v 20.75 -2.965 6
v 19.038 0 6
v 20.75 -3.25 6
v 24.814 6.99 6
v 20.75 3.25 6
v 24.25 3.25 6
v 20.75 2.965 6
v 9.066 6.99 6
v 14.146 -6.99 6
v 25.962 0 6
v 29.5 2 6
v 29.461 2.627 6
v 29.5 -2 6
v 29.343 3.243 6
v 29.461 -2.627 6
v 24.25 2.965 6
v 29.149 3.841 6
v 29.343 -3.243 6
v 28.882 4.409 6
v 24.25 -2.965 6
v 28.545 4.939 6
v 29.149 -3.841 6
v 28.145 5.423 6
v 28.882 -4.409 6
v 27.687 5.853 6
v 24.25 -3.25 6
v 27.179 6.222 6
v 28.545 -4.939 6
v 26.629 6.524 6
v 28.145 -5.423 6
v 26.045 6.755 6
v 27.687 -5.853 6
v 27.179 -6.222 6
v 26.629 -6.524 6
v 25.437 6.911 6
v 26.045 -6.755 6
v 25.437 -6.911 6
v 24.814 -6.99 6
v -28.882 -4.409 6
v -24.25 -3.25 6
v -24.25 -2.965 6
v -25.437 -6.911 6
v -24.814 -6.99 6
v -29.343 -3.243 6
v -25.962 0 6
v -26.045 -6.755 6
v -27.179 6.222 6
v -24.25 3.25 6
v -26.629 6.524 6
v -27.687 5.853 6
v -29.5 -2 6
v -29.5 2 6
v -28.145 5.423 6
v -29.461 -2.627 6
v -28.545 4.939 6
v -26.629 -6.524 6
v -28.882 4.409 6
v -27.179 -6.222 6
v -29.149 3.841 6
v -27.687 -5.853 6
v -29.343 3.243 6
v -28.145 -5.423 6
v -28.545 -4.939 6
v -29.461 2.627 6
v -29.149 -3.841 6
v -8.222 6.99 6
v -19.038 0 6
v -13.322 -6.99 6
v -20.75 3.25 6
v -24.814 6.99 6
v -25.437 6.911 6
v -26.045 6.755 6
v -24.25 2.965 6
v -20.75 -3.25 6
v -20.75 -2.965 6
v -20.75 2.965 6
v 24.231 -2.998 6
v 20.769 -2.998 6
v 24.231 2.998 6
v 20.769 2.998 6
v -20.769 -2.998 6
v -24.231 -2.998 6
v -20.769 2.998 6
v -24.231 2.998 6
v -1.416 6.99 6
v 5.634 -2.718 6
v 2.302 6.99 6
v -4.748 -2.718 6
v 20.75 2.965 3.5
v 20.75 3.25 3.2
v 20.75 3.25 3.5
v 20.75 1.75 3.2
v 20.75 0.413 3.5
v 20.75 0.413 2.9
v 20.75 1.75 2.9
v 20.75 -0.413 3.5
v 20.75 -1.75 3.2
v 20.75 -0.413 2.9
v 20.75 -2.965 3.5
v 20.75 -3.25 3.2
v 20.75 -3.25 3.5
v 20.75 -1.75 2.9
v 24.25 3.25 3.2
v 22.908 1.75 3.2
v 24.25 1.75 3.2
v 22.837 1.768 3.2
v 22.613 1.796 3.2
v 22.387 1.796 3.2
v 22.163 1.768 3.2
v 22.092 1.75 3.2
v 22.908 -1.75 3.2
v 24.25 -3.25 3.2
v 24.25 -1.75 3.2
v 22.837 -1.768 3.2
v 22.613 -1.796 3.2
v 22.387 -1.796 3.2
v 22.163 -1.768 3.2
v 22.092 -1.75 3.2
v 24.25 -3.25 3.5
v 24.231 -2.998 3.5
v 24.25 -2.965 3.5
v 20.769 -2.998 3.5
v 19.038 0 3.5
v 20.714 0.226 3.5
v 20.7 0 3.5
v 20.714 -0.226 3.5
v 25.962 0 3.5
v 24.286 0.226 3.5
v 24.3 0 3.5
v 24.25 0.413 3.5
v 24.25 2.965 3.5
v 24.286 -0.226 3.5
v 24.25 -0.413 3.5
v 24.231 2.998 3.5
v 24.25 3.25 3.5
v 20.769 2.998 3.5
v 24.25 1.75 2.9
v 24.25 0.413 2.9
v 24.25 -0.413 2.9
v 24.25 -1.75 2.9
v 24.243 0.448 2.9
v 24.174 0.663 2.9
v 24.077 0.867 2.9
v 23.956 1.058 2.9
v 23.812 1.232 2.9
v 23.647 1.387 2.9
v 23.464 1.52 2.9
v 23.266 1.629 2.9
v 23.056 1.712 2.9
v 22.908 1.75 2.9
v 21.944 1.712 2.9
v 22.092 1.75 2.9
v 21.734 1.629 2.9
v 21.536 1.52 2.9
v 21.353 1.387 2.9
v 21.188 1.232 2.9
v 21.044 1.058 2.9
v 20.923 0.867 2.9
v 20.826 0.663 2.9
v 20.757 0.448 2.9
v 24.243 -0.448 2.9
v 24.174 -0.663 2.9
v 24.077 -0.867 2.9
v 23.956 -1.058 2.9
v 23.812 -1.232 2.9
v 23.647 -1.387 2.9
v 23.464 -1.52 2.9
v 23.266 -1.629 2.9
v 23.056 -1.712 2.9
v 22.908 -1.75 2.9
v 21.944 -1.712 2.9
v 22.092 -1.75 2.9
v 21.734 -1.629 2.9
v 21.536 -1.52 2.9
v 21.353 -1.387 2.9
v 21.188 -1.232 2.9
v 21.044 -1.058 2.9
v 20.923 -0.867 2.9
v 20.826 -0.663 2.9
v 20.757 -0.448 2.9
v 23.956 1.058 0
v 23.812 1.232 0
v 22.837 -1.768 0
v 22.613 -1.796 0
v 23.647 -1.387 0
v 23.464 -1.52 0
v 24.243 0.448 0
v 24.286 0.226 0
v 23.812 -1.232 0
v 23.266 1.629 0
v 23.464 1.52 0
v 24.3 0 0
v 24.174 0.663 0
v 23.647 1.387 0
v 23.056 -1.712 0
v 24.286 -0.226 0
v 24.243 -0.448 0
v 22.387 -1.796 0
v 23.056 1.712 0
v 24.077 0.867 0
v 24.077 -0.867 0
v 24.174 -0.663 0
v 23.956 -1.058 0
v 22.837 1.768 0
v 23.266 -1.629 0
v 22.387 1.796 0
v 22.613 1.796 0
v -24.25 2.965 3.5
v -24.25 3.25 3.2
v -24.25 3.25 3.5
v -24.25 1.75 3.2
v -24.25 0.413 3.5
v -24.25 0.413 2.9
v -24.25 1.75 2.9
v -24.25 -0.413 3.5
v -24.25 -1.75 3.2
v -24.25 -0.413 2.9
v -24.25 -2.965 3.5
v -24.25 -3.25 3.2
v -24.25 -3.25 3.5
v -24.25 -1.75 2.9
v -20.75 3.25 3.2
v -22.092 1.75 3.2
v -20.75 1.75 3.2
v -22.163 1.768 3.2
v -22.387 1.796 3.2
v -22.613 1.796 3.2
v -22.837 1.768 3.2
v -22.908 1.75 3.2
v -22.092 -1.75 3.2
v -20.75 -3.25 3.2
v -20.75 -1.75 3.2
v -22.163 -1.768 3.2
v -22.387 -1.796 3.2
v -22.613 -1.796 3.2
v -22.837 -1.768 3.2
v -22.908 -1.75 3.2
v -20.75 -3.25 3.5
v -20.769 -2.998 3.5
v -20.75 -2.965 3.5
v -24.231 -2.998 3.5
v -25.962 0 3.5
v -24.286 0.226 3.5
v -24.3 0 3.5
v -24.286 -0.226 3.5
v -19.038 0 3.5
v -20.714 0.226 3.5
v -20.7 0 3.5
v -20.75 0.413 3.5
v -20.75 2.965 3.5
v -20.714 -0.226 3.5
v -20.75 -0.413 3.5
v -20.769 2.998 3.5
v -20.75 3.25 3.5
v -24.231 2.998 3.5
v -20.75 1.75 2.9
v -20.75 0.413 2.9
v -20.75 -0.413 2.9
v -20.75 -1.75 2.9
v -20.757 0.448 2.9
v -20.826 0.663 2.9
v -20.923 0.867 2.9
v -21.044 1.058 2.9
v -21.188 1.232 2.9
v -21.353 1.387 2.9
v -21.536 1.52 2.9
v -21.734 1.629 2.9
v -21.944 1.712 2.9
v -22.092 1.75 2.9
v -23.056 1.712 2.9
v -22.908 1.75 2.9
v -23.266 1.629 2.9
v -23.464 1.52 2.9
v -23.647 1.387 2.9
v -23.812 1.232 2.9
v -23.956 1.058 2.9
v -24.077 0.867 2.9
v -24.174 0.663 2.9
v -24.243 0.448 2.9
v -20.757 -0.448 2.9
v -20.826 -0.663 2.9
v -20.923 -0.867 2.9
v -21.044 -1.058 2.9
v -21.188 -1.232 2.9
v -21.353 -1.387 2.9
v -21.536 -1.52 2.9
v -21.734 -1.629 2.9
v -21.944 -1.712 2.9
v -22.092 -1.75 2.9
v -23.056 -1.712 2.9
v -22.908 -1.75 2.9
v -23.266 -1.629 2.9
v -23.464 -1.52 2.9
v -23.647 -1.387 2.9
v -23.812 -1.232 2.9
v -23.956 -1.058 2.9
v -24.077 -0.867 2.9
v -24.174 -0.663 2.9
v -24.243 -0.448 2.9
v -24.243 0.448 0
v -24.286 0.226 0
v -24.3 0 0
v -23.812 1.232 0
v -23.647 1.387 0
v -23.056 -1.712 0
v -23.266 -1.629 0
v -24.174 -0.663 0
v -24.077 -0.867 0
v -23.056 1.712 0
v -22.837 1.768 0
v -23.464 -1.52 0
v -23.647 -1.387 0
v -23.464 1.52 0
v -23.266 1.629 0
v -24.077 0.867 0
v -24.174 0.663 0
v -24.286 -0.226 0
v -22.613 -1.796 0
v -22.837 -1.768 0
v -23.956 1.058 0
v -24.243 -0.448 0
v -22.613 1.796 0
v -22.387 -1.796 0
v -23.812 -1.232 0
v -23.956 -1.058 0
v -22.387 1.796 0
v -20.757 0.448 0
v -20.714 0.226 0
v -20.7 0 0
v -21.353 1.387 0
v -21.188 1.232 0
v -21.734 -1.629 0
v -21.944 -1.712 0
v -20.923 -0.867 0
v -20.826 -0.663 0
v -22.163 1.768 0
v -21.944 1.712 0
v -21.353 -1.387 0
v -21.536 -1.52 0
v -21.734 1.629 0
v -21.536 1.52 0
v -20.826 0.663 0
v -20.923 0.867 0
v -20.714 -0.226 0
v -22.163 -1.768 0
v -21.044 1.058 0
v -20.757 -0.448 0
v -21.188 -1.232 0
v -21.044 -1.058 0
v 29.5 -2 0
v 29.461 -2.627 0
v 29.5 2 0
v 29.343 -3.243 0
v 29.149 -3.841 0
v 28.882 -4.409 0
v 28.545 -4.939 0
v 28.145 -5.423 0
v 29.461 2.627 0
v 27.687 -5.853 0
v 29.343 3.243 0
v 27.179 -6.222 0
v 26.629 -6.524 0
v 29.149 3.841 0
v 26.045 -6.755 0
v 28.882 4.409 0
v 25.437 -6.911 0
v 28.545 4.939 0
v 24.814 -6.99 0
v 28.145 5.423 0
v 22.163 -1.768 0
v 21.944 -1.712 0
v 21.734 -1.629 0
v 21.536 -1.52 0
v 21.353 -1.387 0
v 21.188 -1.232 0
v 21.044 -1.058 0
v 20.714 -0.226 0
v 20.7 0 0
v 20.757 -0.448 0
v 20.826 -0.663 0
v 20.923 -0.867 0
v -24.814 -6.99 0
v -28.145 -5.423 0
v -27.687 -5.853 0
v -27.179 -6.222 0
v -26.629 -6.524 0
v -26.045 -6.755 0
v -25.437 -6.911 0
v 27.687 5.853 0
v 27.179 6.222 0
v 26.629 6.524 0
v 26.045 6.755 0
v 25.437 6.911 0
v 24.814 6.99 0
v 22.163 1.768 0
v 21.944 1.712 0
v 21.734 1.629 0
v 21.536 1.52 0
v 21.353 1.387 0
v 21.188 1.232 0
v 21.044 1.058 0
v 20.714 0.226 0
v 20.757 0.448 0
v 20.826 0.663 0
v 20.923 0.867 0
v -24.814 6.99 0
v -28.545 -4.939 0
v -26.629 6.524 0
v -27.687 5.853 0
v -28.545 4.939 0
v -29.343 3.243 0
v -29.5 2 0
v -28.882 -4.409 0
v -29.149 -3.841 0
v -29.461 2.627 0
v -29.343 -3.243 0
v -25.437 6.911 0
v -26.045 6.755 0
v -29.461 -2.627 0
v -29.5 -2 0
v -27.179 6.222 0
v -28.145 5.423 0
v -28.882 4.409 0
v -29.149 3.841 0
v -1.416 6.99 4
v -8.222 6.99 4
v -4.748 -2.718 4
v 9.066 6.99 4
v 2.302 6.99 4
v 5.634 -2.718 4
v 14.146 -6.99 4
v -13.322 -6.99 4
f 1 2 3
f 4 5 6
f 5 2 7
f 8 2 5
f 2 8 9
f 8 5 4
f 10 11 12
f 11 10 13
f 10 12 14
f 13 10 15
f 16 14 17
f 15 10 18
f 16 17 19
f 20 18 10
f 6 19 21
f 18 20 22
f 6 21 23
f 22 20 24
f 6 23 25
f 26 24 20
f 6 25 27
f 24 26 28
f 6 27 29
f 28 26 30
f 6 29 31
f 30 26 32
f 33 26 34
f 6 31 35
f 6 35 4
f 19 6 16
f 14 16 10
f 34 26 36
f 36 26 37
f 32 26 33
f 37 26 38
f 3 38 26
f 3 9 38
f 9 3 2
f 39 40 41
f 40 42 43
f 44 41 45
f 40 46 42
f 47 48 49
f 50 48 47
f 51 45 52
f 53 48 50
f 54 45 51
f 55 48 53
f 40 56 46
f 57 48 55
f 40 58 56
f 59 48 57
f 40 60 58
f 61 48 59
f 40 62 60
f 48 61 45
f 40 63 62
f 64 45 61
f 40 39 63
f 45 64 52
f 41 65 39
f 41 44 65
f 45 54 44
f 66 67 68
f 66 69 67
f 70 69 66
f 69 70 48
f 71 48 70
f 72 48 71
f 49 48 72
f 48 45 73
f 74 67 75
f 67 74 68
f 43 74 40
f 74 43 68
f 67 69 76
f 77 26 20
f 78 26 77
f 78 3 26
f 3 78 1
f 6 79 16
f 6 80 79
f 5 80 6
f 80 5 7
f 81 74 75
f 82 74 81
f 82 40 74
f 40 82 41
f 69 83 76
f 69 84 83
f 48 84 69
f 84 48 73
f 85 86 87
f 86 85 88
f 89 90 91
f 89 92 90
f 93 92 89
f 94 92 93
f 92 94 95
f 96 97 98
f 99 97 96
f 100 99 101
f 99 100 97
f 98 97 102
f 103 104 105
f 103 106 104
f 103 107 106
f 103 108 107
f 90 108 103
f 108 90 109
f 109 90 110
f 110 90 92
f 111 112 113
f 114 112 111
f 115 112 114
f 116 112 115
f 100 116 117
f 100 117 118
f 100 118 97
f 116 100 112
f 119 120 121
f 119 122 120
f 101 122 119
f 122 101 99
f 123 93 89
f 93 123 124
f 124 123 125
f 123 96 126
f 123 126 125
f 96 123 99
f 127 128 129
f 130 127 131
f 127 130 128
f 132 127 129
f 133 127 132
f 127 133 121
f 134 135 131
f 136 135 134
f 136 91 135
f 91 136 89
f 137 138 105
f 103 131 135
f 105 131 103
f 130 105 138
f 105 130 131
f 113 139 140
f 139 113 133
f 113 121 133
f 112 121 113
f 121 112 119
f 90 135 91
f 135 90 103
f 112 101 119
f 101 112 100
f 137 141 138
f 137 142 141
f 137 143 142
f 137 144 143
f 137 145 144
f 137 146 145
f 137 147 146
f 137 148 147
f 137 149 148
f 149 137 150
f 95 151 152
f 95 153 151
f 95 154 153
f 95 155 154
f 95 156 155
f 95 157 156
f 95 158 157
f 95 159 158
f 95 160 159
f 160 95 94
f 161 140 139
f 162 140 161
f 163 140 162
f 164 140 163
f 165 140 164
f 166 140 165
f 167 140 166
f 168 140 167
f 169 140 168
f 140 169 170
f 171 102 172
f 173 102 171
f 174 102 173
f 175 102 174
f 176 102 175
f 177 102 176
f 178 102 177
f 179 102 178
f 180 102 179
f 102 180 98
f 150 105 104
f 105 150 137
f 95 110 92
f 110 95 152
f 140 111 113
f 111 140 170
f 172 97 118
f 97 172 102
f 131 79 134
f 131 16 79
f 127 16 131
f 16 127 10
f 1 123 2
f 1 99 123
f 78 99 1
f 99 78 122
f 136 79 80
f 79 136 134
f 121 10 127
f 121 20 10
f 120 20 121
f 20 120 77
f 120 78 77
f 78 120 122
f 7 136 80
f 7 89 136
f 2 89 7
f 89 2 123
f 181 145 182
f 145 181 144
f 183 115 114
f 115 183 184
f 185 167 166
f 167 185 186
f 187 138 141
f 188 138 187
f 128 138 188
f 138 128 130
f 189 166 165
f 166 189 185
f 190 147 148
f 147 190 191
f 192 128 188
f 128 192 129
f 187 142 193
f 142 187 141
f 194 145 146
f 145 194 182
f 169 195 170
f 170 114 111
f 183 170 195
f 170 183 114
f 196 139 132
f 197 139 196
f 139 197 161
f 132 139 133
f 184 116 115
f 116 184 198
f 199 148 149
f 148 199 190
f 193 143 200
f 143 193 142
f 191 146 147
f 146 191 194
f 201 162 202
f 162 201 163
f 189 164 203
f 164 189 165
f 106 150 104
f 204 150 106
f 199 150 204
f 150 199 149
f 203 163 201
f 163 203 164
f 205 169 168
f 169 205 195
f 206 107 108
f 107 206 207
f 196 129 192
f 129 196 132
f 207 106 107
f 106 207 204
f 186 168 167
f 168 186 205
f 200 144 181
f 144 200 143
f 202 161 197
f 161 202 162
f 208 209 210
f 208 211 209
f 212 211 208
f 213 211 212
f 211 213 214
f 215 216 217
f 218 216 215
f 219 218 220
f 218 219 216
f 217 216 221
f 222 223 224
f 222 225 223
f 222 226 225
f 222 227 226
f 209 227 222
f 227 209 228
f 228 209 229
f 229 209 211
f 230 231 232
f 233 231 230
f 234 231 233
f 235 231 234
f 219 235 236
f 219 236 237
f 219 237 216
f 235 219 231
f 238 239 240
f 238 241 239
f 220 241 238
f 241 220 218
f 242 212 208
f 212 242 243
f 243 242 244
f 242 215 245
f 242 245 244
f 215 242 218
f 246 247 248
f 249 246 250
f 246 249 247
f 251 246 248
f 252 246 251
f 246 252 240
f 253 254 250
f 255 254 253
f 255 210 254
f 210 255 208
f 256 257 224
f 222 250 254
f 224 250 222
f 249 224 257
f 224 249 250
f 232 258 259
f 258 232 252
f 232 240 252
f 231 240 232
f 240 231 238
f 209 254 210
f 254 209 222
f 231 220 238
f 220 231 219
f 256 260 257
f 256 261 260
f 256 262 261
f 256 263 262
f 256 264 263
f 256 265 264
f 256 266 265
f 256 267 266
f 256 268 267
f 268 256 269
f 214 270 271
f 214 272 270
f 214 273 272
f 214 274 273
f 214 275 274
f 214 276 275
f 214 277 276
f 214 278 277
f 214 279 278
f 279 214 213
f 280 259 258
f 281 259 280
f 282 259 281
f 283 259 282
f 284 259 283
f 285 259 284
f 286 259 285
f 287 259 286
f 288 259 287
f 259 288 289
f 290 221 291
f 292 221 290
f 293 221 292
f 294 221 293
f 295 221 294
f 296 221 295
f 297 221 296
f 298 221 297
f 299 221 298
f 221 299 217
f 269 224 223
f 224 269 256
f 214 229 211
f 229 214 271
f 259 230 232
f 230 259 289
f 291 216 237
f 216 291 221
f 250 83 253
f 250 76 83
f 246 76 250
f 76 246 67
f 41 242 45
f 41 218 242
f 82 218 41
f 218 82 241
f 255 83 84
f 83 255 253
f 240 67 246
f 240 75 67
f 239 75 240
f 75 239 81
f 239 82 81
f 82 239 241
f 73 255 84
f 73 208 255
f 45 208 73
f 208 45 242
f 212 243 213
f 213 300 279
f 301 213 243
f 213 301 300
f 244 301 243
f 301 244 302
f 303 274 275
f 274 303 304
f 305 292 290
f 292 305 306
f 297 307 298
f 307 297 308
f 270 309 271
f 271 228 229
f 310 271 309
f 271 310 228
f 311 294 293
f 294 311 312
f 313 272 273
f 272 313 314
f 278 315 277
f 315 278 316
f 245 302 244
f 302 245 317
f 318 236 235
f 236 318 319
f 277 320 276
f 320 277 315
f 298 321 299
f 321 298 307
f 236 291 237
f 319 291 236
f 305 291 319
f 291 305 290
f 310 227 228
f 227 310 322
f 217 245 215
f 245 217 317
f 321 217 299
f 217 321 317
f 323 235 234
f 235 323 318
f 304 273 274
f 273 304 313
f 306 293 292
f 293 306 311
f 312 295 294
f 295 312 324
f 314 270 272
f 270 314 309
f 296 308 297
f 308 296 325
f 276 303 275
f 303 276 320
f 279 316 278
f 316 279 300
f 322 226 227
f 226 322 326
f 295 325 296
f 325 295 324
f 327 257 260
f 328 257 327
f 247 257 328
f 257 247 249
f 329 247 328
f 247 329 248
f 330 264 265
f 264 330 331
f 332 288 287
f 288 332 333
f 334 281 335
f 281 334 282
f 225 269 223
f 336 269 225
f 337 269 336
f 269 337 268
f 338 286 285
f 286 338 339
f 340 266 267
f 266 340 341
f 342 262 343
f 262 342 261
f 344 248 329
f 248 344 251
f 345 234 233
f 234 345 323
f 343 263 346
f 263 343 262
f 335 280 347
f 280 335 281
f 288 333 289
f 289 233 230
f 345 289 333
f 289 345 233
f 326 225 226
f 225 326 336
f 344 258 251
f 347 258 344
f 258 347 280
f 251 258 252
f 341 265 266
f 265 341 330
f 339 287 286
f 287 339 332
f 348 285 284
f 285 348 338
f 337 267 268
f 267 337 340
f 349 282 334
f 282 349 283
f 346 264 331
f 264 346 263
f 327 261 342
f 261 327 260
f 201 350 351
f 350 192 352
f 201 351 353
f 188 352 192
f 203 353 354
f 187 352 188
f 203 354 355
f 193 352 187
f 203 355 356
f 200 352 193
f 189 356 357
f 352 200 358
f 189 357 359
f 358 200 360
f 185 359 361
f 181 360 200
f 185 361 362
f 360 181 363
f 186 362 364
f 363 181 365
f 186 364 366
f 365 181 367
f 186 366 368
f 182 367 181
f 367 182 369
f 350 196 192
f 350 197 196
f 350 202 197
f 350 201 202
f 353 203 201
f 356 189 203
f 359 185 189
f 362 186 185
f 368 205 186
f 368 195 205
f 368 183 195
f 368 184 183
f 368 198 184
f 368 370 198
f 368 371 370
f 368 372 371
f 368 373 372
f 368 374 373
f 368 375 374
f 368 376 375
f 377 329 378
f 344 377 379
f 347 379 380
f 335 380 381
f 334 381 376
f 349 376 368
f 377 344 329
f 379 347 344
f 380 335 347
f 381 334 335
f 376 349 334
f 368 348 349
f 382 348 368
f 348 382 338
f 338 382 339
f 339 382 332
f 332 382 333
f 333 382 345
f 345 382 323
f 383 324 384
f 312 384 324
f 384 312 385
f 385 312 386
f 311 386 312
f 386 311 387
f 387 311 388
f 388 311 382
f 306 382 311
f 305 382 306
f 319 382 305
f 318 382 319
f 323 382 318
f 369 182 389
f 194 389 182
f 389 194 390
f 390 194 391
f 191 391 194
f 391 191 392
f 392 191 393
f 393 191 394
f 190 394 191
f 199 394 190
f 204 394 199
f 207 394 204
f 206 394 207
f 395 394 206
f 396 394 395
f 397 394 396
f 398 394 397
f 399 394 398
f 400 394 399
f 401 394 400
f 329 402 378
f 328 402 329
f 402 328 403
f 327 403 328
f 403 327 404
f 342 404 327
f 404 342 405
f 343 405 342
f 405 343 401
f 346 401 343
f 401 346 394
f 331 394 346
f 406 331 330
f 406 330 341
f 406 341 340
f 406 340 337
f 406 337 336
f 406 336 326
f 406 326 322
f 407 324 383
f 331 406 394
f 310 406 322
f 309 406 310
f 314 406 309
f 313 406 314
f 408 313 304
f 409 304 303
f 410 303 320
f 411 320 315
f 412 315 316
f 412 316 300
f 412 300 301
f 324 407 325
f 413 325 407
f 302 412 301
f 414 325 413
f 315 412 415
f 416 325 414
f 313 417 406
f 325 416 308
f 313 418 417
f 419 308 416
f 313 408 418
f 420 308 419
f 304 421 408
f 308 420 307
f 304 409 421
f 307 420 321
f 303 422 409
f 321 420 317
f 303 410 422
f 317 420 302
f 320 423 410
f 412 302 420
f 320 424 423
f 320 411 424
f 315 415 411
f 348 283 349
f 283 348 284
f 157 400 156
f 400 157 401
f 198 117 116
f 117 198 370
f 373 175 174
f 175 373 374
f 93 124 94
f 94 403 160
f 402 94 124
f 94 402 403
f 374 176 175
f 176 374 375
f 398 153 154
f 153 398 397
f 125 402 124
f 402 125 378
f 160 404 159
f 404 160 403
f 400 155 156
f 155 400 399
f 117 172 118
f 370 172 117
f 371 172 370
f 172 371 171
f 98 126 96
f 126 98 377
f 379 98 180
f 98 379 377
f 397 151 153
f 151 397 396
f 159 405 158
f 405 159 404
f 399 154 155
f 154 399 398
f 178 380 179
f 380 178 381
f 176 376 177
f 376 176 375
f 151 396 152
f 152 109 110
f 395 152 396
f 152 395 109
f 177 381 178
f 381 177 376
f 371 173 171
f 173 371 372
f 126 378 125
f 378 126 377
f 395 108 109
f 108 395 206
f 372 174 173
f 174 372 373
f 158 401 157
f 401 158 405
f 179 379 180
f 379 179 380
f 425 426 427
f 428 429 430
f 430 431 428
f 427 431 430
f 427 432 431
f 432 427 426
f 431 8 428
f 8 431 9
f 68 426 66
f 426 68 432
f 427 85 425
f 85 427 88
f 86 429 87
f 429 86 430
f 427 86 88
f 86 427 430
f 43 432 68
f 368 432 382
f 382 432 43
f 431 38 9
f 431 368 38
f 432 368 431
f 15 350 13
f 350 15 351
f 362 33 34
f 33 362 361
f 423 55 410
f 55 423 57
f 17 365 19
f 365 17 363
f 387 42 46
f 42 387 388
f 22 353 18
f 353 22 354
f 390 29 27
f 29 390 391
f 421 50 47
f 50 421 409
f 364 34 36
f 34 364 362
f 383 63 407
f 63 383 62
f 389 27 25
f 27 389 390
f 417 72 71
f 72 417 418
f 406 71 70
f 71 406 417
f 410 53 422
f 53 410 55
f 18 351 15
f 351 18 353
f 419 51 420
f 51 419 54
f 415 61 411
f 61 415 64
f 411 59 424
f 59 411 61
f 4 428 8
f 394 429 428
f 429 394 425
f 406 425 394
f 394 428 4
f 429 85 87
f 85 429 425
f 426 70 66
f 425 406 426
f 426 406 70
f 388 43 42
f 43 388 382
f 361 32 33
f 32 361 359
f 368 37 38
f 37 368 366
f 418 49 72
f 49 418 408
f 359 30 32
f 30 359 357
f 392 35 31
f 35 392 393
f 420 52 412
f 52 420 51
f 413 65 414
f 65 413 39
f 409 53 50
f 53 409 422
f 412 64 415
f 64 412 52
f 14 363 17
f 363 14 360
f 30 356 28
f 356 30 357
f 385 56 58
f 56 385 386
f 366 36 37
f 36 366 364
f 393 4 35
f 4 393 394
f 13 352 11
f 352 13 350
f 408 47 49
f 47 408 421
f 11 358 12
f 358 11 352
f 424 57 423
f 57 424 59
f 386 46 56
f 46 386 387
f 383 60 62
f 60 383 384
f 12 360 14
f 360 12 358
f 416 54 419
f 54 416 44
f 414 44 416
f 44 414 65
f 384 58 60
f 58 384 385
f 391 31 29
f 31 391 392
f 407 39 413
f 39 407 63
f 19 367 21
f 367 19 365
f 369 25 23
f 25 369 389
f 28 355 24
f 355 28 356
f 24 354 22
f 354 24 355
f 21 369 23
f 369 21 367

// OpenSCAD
$fn = 50;


difference() {
	union() {
		hull() {
			translate(v = [-24.5000000000, 2.0000000000, 0]) {
				cylinder(h = 6, r = 5);
			}
			translate(v = [24.5000000000, 2.0000000000, 0]) {
				cylinder(h = 6, r = 5);
			}
			translate(v = [-24.5000000000, -2.0000000000, 0]) {
				cylinder(h = 6, r = 5);
			}
			translate(v = [24.5000000000, -2.0000000000, 0]) {
				cylinder(h = 6, r = 5);
			}
		}
	}
	union() {
		translate(v = [22.5000000000, 0, -20]) {
			rotate(a = [0, 180, 0]) {
				difference() {
					union() {
						translate(v = [0, 0, -26.0000000000]) {
							rotate(a = [0, 0, 0]) {
								difference() {
									union() {
										#translate(v = [-1.7500000000, -3.2500000000, -0.3000000000]) {
											cube(size = [3.5000000000, 6.5000000000, 0.3000000000]);
										}
										#translate(v = [-1.7500000000, -1.7500000000, -0.6000000000]) {
											cube(size = [3.5000000000, 3.5000000000, 0.3000000000]);
										}
										#translate(v = [-1.7500000000, -3.2500000000, 2.5000000000]) {
											cube(size = [3.5000000000, 6.5000000000, 0.3000000000]);
										}
										#translate(v = [-1.7500000000, -1.7500000000, 2.8000000000]) {
											cube(size = [3.5000000000, 3.5000000000, 0.3000000000]);
										}
										#linear_extrude(height = 2.5000000000) {
											polygon(points = [[3.4620000000, 0.0000000000], [1.7310000000, 2.9981799479], [-1.7310000000, 2.9981799479], [-3.4620000000, 0.0000000000], [-1.7310000000, -2.9981799479], [1.7310000000, -2.9981799479]]);
										}
										#translate(v = [-1.7500000000, -3.2500000000, -0.3000000000]) {
											cube(size = [3.5000000000, 6.5000000000, 0.3000000000]);
										}
										#translate(v = [-1.7500000000, -1.7500000000, -0.6000000000]) {
											cube(size = [3.5000000000, 3.5000000000, 0.3000000000]);
										}
										#translate(v = [-1.7500000000, -3.2500000000, 2.5000000000]) {
											cube(size = [3.5000000000, 6.5000000000, 0.3000000000]);
										}
										#translate(v = [-1.7500000000, -1.7500000000, 2.8000000000]) {
											cube(size = [3.5000000000, 3.5000000000, 0.3000000000]);
										}
										#translate(v = [-1.7500000000, -3.2500000000, -0.3000000000]) {
											cube(size = [3.5000000000, 6.5000000000, 0.3000000000]);
										}
										#translate(v = [-1.7500000000, -1.7500000000, -0.6000000000]) {
											cube(size = [3.5000000000, 3.5000000000, 0.3000000000]);
										}
										#translate(v = [-1.7500000000, -3.2500000000, 2.5000000000]) {
											cube(size = [3.5000000000, 6.5000000000, 0.3000000000]);
										}
										#translate(v = [-1.7500000000, -1.7500000000, 2.8000000000]) {
											cube(size = [3.5000000000, 3.5000000000, 0.3000000000]);
										}
									}
									union();
								}
							}
						}
						translate(v = [0, 0, -26.0000000000]) {
							rotate(a = [0, 0, 0]) {
								difference() {
									union() {
										#translate(v = [-1.7500000000, -3.2500000000, -0.3000000000]) {
											cube(size = [3.5000000000, 6.5000000000, 0.3000000000]);
										}
										#translate(v = [-1.7500000000, -1.7500000000, -0.6000000000]) {
											cube(size = [3.5000000000, 3.5000000000, 0.3000000000]);
										}
										#translate(v = [-1.7500000000, -3.2500000000, 2.5000000000]) {
											cube(size = [3.5000000000, 6.5000000000, 0.3000000000]);
										}
										#translate(v = [-1.7500000000, -1.7500000000, 2.8000000000]) {
											cube(size = [3.5000000000, 3.5000000000, 0.3000000000]);
										}
										#linear_extrude(height = 2.5000000000) {
											polygon(points = [[3.4620000000, 0.0000000000], [1.7310000000, 2.9981799479], [-1.7310000000, 2.9981799479], [-3.4620000000, 0.0000000000], [-1.7310000000, -2.9981799479], [1.7310000000, -2.9981799479]]);
										}
										#translate(v = [-1.7500000000, -3.2500000000, -0.3000000000]) {
											cube(size = [3.5000000000, 6.5000000000, 0.3000000000]);
										}
										#translate(v = [-1.7500000000, -1.7500000000, -0.6000000000]) {
											cube(size = [3.5000000000, 3.5000000000, 0.3000000000]);
										}
										#translate(v = [-1.7500000000, -3.2500000000, 2.5000000000]) {
											cube(size = [3.5000000000, 6.5000000000, 0.3000000000]);
										}
										#translate(v = [-1.7500000000, -1.7500000000, 2.8000000000]) {
											cube(size = [3.5000000000, 3.5000000000, 0.3000000000]);
										}
										#translate(v = [-1.7500000000, -3.2500000000, -0.3000000000]) {
											cube(size = [3.5000000000, 6.5000000000, 0.3000000000]);
										}
										#translate(v = [-1.7500000000, -1.7500000000, -0.6000000000]) {
											cube(size = [3.5000000000, 3.5000000000, 0.3000000000]);
										}
										#translate(v = [-1.7500000000, -3.2500000000, 2.5000000000]) {
											cube(size = [3.5000000000, 6.5000000000, 0.3000000000]);
										}
										#translate(v = [-1.7500000000, -1.7500000000, 2.8000000000]) {
											cube(size = [3.5000000000, 3.5000000000, 0.3000000000]);
										}
									}
									union();
								}
							}
						}
						translate(v = [0, 0, -26.0000000000]) {
							rotate(a = [0, 0, 0]) {
								difference() {
									union() {
										#translate(v = [-1.7500000000, -3.2500000000, -0.3000000000]) {
											cube(size = [3.5000000000, 6.5000000000, 0.3000000000]);
										}
										#translate(v = [-1.7500000000, -1.7500000000, -0.6000000000]) {
											cube(size = [3.5000000000, 3.5000000000, 0.3000000000]);
										}
										#translate(v = [-1.7500000000, -3.2500000000, 2.5000000000]) {
											cube(size = [3.5000000000, 6.5000000000, 0.3000000000]);
										}
										#translate(v = [-1.7500000000, -1.7500000000, 2.8000000000]) {
											cube(size = [3.5000000000, 3.5000000000, 0.3000000000]);
										}
										#linear_extrude(height = 2.5000000000) {
											polygon(points = [[3.4620000000, 0.0000000000], [1.7310000000, 2.9981799479], [-1.7310000000, 2.9981799479], [-3.4620000000, 0.0000000000], [-1.7310000000, -2.9981799479], [1.7310000000, -2.9981799479]]);
										}
										#translate(v = [-1.7500000000, -3.2500000000, -0.3000000000]) {
											cube(size = [3.5000000000, 6.5000000000, 0.3000000000]);
										}
										#translate(v = [-1.7500000000, -1.7500000000, -0.6000000000]) {
											cube(size = [3.5000000000, 3.5000000000, 0.3000000000]);
										}
										#translate(v = [-1.7500000000, -3.2500000000, 2.5000000000]) {
											cube(size = [3.5000000000, 6.5000000000, 0.3000000000]);
										}
										#translate(v = [-1.7500000000, -1.7500000000, 2.8000000000]) {
											cube(size = [3.5000000000, 3.5000000000, 0.3000000000]);
										}
										#translate(v = [-1.7500000000, -3.2500000000, -0.3000000000]) {
											cube(size = [3.5000000000, 6.5000000000, 0.3000000000]);
										}
										#translate(v = [-1.7500000000, -1.7500000000, -0.6000000000]) {
											cube(size = [3.5000000000, 3.5000000000, 0.3000000000]);
										}
										#translate(v = [-1.7500000000, -3.2500000000, 2.5000000000]) {
											cube(size = [3.5000000000, 6.5000000000, 0.3000000000]);
										}
										#translate(v = [-1.7500000000, -1.7500000000, 2.8000000000]) {
											cube(size = [3.5000000000, 3.5000000000, 0.3000000000]);
										}
									}
									union();
								}
							}
						}
						#translate(v = [0, 0, -26.0000000000]) {
							cylinder(h = 26, r = 1.5000000000);
						}
						#translate(v = [0, 0, -1.9000000000]) {
							cylinder(h = 1.9000000000, r1 = 1.8000000000, r2 = 3.6000000000);
						}
						#translate(v = [0, 0, -26.0000000000]) {
							cylinder(h = 26, r = 1.8000000000);
						}
						#translate(v = [0, 0, -26.0000000000]) {
							cylinder(h = 26, r = 1.5000000000);
						}
					}
					union();
				}
			}
		}
		translate(v = [-22.5000000000, 0, -20]) {
			rotate(a = [0, 180, 0]) {
				difference() {
					union() {
						translate(v = [0, 0, -26.0000000000]) {
							rotate(a = [0, 0, 0]) {
								difference() {
									union() {
										#translate(v = [-1.7500000000, -3.2500000000, -0.3000000000]) {
											cube(size = [3.5000000000, 6.5000000000, 0.3000000000]);
										}
										#translate(v = [-1.7500000000, -1.7500000000, -0.6000000000]) {
											cube(size = [3.5000000000, 3.5000000000, 0.3000000000]);
										}
										#translate(v = [-1.7500000000, -3.2500000000, 2.5000000000]) {
											cube(size = [3.5000000000, 6.5000000000, 0.3000000000]);
										}
										#translate(v = [-1.7500000000, -1.7500000000, 2.8000000000]) {
											cube(size = [3.5000000000, 3.5000000000, 0.3000000000]);
										}
										#linear_extrude(height = 2.5000000000) {
											polygon(points = [[3.4620000000, 0.0000000000], [1.7310000000, 2.9981799479], [-1.7310000000, 2.9981799479], [-3.4620000000, 0.0000000000], [-1.7310000000, -2.9981799479], [1.7310000000, -2.9981799479]]);
										}
										#translate(v = [-1.7500000000, -3.2500000000, -0.3000000000]) {
											cube(size = [3.5000000000, 6.5000000000, 0.3000000000]);
										}
										#translate(v = [-1.7500000000, -1.7500000000, -0.6000000000]) {
											cube(size = [3.5000000000, 3.5000000000, 0.3000000000]);
										}
										#translate(v = [-1.7500000000, -3.2500000000, 2.5000000000]) {
											cube(size = [3.5000000000, 6.5000000000, 0.3000000000]);
										}
										#translate(v = [-1.7500000000, -1.7500000000, 2.8000000000]) {
											cube(size = [3.5000000000, 3.5000000000, 0.3000000000]);
										}
										#translate(v = [-1.7500000000, -3.2500000000, -0.3000000000]) {
											cube(size = [3.5000000000, 6.5000000000, 0.3000000000]);
										}
										#translate(v = [-1.7500000000, -1.7500000000, -0.6000000000]) {
											cube(size = [3.5000000000, 3.5000000000, 0.3000000000]);
										}
										#translate(v = [-1.7500000000, -3.2500000000, 2.5000000000]) {
											cube(size = [3.5000000000, 6.5000000000, 0.3000000000]);
										}
										#translate(v = [-1.7500000000, -1.7500000000, 2.8000000000]) {
											cube(size = [3.5000000000, 3.5000000000, 0.3000000000]);
										}
									}
									union();
								}
							}
						}
						translate(v = [0, 0, -26.0000000000]) {
							rotate(a = [0, 0, 0]) {
								difference() {
									union() {
										#translate(v = [-1.7500000000, -3.2500000000, -0.3000000000]) {
											cube(size = [3.5000000000, 6.5000000000, 0.3000000000]);
										}
										#translate(v = [-1.7500000000, -1.7500000000, -0.6000000000]) {
											cube(size = [3.5000000000, 3.5000000000, 0.3000000000]);
										}
										#translate(v = [-1.7500000000, -3.2500000000, 2.5000000000]) {
											cube(size = [3.5000000000, 6.5000000000, 0.3000000000]);
										}
										#translate(v = [-1.7500000000, -1.7500000000, 2.8000000000]) {
											cube(size = [3.5000000000, 3.5000000000, 0.3000000000]);
										}
										#linear_extrude(height = 2.5000000000) {
											polygon(points = [[3.4620000000, 0.0000000000], [1.7310000000, 2.9981799479], [-1.7310000000, 2.9981799479], [-3.4620000000, 0.0000000000], [-1.7310000000, -2.9981799479], [1.7310000000, -2.9981799479]]);
										}
										#translate(v = [-1.7500000000, -3.2500000000, -0.3000000000]) {
											cube(size = [3.5000000000, 6.5000000000, 0.3000000000]);
										}
										#translate(v = [-1.7500000000, -1.7500000000, -0.6000000000]) {
											cube(size = [3.5000000000, 3.5000000000, 0.3000000000]);
										}
										#translate(v = [-1.7500000000, -3.2500000000, 2.5000000000]) {
											cube(size = [3.5000000000, 6.5000000000, 0.3000000000]);
										}
										#translate(v = [-1.7500000000, -1.7500000000, 2.8000000000]) {
											cube(size = [3.5000000000, 3.5000000000, 0.3000000000]);
										}
										#translate(v = [-1.7500000000, -3.2500000000, -0.3000000000]) {
											cube(size = [3.5000000000, 6.5000000000, 0.3000000000]);
										}
										#translate(v = [-1.7500000000, -1.7500000000, -0.6000000000]) {
											cube(size = [3.5000000000, 3.5000000000, 0.3000000000]);
										}
										#translate(v = [-1.7500000000, -3.2500000000, 2.5000000000]) {
											cube(size = [3.5000000000, 6.5000000000, 0.3000000000]);
										}
										#translate(v = [-1.7500000000, -1.7500000000, 2.8000000000]) {
											cube(size = [3.5000000000, 3.5000000000, 0.3000000000]);
										}
									}
									union();
								}
							}
						}
						translate(v = [0, 0, -26.0000000000]) {
							rotate(a = [0, 0, 0]) {
								difference() {
									union() {
										#translate(v = [-1.7500000000, -3.2500000000, -0.3000000000]) {
											cube(size = [3.5000000000, 6.5000000000, 0.3000000000]);
										}
										#translate(v = [-1.7500000000, -1.7500000000, -0.6000000000]) {
											cube(size = [3.5000000000, 3.5000000000, 0.3000000000]);
										}
										#translate(v = [-1.7500000000, -3.2500000000, 2.5000000000]) {
											cube(size = [3.5000000000, 6.5000000000, 0.3000000000]);
										}
										#translate(v = [-1.7500000000, -1.7500000000, 2.8000000000]) {
											cube(size = [3.5000000000, 3.5000000000, 0.3000000000]);
										}
										#linear_extrude(height = 2.5000000000) {
											polygon(points = [[3.4620000000, 0.0000000000], [1.7310000000, 2.9981799479], [-1.7310000000, 2.9981799479], [-3.4620000000, 0.0000000000], [-1.7310000000, -2.9981799479], [1.7310000000, -2.9981799479]]);
										}
										#translate(v = [-1.7500000000, -3.2500000000, -0.3000000000]) {
											cube(size = [3.5000000000, 6.5000000000, 0.3000000000]);
										}
										#translate(v = [-1.7500000000, -1.7500000000, -0.6000000000]) {
											cube(size = [3.5000000000, 3.5000000000, 0.3000000000]);
										}
										#translate(v = [-1.7500000000, -3.2500000000, 2.5000000000]) {
											cube(size = [3.5000000000, 6.5000000000, 0.3000000000]);
										}
										#translate(v = [-1.7500000000, -1.7500000000, 2.8000000000]) {
											cube(size = [3.5000000000, 3.5000000000, 0.3000000000]);
										}
										#translate(v = [-1.7500000000, -3.2500000000, -0.3000000000]) {
											cube(size = [3.5000000000, 6.5000000000, 0.3000000000]);
										}
										#translate(v = [-1.7500000000, -1.7500000000, -0.6000000000]) {
											cube(size = [3.5000000000, 3.5000000000, 0.3000000000]);
										}
										#translate(v = [-1.7500000000, -3.2500000000, 2.5000000000]) {
											cube(size = [3.5000000000, 6.5000000000, 0.3000000000]);
										}
										#translate(v = [-1.7500000000, -1.7500000000, 2.8000000000]) {
											cube(size = [3.5000000000, 3.5000000000, 0.3000000000]);
										}
									}
									union();
								}
							}
						}
						#translate(v = [0, 0, -26.0000000000]) {
							cylinder(h = 26, r = 1.5000000000);
						}
						#translate(v = [0, 0, -1.9000000000]) {
							cylinder(h = 1.9000000000, r1 = 1.8000000000, r2 = 3.6000000000);
						}
						#translate(v = [0, 0, -26.0000000000]) {
							cylinder(h = 26, r = 1.8000000000);
						}
						#translate(v = [0, 0, -26.0000000000]) {
							cylinder(h = 26, r = 1.5000000000);
						}
					}
					union();
				}
			}
		}
		translate(v = [-22.5000000000, 0.0000000000, 0]) {
			cylinder(h = 6, r = 1.8000000000);
		}
		translate(v = [22.5000000000, 0.0000000000, 0]) {
			cylinder(h = 6, r = 1.8000000000);
		}
		translate(v = [-22.5000000000, 0.0000000000, 0]) {
			cylinder(h = 6, r = 1.8000000000);
		}
		translate(v = [22.5000000000, 0.0000000000, 0]) {
			cylinder(h = 6, r = 1.8000000000);
		}
		translate(v = [-22.5000000000, 0.0000000000, 0]) {
			cylinder(h = 6, r = 1.8000000000);
		}
		translate(v = [22.5000000000, 0.0000000000, 0]) {
			cylinder(h = 6, r = 1.8000000000);
		}
		translate(v = [-22.5000000000, 0.0000000000, 0]) {
			cylinder(h = 6, r = 1.8000000000);
		}
		translate(v = [22.5000000000, 0.0000000000, 0]) {
			cylinder(h = 6, r = 1.8000000000);
		}
		#translate(v = [0, 0, 4]) {
			linear_extrude(height = 2) {
				text(font = "Arial:Bold", halign = "center", size = 37.8000000000, text = "A", valign = "center");
			}
		}
	}
}
